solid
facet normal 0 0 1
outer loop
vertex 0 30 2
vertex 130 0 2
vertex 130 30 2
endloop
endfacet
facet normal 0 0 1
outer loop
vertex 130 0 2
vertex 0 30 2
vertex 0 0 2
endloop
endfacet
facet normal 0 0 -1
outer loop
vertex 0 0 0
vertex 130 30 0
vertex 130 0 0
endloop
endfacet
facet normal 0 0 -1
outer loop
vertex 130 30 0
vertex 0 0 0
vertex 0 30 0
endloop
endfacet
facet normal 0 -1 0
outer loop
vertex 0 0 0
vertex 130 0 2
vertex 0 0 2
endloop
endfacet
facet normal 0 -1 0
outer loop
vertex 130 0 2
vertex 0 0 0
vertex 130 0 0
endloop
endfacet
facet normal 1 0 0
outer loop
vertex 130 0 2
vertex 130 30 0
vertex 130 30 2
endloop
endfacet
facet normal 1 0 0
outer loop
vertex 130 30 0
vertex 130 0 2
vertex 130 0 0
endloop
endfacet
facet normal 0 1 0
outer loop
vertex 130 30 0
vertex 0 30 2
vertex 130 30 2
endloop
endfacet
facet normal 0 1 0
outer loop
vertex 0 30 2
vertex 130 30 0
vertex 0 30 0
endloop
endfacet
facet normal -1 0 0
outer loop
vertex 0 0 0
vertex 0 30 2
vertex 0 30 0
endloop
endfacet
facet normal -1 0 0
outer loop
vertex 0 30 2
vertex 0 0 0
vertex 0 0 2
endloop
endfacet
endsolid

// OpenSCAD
// Simple panel to resize as necessary and stick things to

cube([130, 30, 2]);
